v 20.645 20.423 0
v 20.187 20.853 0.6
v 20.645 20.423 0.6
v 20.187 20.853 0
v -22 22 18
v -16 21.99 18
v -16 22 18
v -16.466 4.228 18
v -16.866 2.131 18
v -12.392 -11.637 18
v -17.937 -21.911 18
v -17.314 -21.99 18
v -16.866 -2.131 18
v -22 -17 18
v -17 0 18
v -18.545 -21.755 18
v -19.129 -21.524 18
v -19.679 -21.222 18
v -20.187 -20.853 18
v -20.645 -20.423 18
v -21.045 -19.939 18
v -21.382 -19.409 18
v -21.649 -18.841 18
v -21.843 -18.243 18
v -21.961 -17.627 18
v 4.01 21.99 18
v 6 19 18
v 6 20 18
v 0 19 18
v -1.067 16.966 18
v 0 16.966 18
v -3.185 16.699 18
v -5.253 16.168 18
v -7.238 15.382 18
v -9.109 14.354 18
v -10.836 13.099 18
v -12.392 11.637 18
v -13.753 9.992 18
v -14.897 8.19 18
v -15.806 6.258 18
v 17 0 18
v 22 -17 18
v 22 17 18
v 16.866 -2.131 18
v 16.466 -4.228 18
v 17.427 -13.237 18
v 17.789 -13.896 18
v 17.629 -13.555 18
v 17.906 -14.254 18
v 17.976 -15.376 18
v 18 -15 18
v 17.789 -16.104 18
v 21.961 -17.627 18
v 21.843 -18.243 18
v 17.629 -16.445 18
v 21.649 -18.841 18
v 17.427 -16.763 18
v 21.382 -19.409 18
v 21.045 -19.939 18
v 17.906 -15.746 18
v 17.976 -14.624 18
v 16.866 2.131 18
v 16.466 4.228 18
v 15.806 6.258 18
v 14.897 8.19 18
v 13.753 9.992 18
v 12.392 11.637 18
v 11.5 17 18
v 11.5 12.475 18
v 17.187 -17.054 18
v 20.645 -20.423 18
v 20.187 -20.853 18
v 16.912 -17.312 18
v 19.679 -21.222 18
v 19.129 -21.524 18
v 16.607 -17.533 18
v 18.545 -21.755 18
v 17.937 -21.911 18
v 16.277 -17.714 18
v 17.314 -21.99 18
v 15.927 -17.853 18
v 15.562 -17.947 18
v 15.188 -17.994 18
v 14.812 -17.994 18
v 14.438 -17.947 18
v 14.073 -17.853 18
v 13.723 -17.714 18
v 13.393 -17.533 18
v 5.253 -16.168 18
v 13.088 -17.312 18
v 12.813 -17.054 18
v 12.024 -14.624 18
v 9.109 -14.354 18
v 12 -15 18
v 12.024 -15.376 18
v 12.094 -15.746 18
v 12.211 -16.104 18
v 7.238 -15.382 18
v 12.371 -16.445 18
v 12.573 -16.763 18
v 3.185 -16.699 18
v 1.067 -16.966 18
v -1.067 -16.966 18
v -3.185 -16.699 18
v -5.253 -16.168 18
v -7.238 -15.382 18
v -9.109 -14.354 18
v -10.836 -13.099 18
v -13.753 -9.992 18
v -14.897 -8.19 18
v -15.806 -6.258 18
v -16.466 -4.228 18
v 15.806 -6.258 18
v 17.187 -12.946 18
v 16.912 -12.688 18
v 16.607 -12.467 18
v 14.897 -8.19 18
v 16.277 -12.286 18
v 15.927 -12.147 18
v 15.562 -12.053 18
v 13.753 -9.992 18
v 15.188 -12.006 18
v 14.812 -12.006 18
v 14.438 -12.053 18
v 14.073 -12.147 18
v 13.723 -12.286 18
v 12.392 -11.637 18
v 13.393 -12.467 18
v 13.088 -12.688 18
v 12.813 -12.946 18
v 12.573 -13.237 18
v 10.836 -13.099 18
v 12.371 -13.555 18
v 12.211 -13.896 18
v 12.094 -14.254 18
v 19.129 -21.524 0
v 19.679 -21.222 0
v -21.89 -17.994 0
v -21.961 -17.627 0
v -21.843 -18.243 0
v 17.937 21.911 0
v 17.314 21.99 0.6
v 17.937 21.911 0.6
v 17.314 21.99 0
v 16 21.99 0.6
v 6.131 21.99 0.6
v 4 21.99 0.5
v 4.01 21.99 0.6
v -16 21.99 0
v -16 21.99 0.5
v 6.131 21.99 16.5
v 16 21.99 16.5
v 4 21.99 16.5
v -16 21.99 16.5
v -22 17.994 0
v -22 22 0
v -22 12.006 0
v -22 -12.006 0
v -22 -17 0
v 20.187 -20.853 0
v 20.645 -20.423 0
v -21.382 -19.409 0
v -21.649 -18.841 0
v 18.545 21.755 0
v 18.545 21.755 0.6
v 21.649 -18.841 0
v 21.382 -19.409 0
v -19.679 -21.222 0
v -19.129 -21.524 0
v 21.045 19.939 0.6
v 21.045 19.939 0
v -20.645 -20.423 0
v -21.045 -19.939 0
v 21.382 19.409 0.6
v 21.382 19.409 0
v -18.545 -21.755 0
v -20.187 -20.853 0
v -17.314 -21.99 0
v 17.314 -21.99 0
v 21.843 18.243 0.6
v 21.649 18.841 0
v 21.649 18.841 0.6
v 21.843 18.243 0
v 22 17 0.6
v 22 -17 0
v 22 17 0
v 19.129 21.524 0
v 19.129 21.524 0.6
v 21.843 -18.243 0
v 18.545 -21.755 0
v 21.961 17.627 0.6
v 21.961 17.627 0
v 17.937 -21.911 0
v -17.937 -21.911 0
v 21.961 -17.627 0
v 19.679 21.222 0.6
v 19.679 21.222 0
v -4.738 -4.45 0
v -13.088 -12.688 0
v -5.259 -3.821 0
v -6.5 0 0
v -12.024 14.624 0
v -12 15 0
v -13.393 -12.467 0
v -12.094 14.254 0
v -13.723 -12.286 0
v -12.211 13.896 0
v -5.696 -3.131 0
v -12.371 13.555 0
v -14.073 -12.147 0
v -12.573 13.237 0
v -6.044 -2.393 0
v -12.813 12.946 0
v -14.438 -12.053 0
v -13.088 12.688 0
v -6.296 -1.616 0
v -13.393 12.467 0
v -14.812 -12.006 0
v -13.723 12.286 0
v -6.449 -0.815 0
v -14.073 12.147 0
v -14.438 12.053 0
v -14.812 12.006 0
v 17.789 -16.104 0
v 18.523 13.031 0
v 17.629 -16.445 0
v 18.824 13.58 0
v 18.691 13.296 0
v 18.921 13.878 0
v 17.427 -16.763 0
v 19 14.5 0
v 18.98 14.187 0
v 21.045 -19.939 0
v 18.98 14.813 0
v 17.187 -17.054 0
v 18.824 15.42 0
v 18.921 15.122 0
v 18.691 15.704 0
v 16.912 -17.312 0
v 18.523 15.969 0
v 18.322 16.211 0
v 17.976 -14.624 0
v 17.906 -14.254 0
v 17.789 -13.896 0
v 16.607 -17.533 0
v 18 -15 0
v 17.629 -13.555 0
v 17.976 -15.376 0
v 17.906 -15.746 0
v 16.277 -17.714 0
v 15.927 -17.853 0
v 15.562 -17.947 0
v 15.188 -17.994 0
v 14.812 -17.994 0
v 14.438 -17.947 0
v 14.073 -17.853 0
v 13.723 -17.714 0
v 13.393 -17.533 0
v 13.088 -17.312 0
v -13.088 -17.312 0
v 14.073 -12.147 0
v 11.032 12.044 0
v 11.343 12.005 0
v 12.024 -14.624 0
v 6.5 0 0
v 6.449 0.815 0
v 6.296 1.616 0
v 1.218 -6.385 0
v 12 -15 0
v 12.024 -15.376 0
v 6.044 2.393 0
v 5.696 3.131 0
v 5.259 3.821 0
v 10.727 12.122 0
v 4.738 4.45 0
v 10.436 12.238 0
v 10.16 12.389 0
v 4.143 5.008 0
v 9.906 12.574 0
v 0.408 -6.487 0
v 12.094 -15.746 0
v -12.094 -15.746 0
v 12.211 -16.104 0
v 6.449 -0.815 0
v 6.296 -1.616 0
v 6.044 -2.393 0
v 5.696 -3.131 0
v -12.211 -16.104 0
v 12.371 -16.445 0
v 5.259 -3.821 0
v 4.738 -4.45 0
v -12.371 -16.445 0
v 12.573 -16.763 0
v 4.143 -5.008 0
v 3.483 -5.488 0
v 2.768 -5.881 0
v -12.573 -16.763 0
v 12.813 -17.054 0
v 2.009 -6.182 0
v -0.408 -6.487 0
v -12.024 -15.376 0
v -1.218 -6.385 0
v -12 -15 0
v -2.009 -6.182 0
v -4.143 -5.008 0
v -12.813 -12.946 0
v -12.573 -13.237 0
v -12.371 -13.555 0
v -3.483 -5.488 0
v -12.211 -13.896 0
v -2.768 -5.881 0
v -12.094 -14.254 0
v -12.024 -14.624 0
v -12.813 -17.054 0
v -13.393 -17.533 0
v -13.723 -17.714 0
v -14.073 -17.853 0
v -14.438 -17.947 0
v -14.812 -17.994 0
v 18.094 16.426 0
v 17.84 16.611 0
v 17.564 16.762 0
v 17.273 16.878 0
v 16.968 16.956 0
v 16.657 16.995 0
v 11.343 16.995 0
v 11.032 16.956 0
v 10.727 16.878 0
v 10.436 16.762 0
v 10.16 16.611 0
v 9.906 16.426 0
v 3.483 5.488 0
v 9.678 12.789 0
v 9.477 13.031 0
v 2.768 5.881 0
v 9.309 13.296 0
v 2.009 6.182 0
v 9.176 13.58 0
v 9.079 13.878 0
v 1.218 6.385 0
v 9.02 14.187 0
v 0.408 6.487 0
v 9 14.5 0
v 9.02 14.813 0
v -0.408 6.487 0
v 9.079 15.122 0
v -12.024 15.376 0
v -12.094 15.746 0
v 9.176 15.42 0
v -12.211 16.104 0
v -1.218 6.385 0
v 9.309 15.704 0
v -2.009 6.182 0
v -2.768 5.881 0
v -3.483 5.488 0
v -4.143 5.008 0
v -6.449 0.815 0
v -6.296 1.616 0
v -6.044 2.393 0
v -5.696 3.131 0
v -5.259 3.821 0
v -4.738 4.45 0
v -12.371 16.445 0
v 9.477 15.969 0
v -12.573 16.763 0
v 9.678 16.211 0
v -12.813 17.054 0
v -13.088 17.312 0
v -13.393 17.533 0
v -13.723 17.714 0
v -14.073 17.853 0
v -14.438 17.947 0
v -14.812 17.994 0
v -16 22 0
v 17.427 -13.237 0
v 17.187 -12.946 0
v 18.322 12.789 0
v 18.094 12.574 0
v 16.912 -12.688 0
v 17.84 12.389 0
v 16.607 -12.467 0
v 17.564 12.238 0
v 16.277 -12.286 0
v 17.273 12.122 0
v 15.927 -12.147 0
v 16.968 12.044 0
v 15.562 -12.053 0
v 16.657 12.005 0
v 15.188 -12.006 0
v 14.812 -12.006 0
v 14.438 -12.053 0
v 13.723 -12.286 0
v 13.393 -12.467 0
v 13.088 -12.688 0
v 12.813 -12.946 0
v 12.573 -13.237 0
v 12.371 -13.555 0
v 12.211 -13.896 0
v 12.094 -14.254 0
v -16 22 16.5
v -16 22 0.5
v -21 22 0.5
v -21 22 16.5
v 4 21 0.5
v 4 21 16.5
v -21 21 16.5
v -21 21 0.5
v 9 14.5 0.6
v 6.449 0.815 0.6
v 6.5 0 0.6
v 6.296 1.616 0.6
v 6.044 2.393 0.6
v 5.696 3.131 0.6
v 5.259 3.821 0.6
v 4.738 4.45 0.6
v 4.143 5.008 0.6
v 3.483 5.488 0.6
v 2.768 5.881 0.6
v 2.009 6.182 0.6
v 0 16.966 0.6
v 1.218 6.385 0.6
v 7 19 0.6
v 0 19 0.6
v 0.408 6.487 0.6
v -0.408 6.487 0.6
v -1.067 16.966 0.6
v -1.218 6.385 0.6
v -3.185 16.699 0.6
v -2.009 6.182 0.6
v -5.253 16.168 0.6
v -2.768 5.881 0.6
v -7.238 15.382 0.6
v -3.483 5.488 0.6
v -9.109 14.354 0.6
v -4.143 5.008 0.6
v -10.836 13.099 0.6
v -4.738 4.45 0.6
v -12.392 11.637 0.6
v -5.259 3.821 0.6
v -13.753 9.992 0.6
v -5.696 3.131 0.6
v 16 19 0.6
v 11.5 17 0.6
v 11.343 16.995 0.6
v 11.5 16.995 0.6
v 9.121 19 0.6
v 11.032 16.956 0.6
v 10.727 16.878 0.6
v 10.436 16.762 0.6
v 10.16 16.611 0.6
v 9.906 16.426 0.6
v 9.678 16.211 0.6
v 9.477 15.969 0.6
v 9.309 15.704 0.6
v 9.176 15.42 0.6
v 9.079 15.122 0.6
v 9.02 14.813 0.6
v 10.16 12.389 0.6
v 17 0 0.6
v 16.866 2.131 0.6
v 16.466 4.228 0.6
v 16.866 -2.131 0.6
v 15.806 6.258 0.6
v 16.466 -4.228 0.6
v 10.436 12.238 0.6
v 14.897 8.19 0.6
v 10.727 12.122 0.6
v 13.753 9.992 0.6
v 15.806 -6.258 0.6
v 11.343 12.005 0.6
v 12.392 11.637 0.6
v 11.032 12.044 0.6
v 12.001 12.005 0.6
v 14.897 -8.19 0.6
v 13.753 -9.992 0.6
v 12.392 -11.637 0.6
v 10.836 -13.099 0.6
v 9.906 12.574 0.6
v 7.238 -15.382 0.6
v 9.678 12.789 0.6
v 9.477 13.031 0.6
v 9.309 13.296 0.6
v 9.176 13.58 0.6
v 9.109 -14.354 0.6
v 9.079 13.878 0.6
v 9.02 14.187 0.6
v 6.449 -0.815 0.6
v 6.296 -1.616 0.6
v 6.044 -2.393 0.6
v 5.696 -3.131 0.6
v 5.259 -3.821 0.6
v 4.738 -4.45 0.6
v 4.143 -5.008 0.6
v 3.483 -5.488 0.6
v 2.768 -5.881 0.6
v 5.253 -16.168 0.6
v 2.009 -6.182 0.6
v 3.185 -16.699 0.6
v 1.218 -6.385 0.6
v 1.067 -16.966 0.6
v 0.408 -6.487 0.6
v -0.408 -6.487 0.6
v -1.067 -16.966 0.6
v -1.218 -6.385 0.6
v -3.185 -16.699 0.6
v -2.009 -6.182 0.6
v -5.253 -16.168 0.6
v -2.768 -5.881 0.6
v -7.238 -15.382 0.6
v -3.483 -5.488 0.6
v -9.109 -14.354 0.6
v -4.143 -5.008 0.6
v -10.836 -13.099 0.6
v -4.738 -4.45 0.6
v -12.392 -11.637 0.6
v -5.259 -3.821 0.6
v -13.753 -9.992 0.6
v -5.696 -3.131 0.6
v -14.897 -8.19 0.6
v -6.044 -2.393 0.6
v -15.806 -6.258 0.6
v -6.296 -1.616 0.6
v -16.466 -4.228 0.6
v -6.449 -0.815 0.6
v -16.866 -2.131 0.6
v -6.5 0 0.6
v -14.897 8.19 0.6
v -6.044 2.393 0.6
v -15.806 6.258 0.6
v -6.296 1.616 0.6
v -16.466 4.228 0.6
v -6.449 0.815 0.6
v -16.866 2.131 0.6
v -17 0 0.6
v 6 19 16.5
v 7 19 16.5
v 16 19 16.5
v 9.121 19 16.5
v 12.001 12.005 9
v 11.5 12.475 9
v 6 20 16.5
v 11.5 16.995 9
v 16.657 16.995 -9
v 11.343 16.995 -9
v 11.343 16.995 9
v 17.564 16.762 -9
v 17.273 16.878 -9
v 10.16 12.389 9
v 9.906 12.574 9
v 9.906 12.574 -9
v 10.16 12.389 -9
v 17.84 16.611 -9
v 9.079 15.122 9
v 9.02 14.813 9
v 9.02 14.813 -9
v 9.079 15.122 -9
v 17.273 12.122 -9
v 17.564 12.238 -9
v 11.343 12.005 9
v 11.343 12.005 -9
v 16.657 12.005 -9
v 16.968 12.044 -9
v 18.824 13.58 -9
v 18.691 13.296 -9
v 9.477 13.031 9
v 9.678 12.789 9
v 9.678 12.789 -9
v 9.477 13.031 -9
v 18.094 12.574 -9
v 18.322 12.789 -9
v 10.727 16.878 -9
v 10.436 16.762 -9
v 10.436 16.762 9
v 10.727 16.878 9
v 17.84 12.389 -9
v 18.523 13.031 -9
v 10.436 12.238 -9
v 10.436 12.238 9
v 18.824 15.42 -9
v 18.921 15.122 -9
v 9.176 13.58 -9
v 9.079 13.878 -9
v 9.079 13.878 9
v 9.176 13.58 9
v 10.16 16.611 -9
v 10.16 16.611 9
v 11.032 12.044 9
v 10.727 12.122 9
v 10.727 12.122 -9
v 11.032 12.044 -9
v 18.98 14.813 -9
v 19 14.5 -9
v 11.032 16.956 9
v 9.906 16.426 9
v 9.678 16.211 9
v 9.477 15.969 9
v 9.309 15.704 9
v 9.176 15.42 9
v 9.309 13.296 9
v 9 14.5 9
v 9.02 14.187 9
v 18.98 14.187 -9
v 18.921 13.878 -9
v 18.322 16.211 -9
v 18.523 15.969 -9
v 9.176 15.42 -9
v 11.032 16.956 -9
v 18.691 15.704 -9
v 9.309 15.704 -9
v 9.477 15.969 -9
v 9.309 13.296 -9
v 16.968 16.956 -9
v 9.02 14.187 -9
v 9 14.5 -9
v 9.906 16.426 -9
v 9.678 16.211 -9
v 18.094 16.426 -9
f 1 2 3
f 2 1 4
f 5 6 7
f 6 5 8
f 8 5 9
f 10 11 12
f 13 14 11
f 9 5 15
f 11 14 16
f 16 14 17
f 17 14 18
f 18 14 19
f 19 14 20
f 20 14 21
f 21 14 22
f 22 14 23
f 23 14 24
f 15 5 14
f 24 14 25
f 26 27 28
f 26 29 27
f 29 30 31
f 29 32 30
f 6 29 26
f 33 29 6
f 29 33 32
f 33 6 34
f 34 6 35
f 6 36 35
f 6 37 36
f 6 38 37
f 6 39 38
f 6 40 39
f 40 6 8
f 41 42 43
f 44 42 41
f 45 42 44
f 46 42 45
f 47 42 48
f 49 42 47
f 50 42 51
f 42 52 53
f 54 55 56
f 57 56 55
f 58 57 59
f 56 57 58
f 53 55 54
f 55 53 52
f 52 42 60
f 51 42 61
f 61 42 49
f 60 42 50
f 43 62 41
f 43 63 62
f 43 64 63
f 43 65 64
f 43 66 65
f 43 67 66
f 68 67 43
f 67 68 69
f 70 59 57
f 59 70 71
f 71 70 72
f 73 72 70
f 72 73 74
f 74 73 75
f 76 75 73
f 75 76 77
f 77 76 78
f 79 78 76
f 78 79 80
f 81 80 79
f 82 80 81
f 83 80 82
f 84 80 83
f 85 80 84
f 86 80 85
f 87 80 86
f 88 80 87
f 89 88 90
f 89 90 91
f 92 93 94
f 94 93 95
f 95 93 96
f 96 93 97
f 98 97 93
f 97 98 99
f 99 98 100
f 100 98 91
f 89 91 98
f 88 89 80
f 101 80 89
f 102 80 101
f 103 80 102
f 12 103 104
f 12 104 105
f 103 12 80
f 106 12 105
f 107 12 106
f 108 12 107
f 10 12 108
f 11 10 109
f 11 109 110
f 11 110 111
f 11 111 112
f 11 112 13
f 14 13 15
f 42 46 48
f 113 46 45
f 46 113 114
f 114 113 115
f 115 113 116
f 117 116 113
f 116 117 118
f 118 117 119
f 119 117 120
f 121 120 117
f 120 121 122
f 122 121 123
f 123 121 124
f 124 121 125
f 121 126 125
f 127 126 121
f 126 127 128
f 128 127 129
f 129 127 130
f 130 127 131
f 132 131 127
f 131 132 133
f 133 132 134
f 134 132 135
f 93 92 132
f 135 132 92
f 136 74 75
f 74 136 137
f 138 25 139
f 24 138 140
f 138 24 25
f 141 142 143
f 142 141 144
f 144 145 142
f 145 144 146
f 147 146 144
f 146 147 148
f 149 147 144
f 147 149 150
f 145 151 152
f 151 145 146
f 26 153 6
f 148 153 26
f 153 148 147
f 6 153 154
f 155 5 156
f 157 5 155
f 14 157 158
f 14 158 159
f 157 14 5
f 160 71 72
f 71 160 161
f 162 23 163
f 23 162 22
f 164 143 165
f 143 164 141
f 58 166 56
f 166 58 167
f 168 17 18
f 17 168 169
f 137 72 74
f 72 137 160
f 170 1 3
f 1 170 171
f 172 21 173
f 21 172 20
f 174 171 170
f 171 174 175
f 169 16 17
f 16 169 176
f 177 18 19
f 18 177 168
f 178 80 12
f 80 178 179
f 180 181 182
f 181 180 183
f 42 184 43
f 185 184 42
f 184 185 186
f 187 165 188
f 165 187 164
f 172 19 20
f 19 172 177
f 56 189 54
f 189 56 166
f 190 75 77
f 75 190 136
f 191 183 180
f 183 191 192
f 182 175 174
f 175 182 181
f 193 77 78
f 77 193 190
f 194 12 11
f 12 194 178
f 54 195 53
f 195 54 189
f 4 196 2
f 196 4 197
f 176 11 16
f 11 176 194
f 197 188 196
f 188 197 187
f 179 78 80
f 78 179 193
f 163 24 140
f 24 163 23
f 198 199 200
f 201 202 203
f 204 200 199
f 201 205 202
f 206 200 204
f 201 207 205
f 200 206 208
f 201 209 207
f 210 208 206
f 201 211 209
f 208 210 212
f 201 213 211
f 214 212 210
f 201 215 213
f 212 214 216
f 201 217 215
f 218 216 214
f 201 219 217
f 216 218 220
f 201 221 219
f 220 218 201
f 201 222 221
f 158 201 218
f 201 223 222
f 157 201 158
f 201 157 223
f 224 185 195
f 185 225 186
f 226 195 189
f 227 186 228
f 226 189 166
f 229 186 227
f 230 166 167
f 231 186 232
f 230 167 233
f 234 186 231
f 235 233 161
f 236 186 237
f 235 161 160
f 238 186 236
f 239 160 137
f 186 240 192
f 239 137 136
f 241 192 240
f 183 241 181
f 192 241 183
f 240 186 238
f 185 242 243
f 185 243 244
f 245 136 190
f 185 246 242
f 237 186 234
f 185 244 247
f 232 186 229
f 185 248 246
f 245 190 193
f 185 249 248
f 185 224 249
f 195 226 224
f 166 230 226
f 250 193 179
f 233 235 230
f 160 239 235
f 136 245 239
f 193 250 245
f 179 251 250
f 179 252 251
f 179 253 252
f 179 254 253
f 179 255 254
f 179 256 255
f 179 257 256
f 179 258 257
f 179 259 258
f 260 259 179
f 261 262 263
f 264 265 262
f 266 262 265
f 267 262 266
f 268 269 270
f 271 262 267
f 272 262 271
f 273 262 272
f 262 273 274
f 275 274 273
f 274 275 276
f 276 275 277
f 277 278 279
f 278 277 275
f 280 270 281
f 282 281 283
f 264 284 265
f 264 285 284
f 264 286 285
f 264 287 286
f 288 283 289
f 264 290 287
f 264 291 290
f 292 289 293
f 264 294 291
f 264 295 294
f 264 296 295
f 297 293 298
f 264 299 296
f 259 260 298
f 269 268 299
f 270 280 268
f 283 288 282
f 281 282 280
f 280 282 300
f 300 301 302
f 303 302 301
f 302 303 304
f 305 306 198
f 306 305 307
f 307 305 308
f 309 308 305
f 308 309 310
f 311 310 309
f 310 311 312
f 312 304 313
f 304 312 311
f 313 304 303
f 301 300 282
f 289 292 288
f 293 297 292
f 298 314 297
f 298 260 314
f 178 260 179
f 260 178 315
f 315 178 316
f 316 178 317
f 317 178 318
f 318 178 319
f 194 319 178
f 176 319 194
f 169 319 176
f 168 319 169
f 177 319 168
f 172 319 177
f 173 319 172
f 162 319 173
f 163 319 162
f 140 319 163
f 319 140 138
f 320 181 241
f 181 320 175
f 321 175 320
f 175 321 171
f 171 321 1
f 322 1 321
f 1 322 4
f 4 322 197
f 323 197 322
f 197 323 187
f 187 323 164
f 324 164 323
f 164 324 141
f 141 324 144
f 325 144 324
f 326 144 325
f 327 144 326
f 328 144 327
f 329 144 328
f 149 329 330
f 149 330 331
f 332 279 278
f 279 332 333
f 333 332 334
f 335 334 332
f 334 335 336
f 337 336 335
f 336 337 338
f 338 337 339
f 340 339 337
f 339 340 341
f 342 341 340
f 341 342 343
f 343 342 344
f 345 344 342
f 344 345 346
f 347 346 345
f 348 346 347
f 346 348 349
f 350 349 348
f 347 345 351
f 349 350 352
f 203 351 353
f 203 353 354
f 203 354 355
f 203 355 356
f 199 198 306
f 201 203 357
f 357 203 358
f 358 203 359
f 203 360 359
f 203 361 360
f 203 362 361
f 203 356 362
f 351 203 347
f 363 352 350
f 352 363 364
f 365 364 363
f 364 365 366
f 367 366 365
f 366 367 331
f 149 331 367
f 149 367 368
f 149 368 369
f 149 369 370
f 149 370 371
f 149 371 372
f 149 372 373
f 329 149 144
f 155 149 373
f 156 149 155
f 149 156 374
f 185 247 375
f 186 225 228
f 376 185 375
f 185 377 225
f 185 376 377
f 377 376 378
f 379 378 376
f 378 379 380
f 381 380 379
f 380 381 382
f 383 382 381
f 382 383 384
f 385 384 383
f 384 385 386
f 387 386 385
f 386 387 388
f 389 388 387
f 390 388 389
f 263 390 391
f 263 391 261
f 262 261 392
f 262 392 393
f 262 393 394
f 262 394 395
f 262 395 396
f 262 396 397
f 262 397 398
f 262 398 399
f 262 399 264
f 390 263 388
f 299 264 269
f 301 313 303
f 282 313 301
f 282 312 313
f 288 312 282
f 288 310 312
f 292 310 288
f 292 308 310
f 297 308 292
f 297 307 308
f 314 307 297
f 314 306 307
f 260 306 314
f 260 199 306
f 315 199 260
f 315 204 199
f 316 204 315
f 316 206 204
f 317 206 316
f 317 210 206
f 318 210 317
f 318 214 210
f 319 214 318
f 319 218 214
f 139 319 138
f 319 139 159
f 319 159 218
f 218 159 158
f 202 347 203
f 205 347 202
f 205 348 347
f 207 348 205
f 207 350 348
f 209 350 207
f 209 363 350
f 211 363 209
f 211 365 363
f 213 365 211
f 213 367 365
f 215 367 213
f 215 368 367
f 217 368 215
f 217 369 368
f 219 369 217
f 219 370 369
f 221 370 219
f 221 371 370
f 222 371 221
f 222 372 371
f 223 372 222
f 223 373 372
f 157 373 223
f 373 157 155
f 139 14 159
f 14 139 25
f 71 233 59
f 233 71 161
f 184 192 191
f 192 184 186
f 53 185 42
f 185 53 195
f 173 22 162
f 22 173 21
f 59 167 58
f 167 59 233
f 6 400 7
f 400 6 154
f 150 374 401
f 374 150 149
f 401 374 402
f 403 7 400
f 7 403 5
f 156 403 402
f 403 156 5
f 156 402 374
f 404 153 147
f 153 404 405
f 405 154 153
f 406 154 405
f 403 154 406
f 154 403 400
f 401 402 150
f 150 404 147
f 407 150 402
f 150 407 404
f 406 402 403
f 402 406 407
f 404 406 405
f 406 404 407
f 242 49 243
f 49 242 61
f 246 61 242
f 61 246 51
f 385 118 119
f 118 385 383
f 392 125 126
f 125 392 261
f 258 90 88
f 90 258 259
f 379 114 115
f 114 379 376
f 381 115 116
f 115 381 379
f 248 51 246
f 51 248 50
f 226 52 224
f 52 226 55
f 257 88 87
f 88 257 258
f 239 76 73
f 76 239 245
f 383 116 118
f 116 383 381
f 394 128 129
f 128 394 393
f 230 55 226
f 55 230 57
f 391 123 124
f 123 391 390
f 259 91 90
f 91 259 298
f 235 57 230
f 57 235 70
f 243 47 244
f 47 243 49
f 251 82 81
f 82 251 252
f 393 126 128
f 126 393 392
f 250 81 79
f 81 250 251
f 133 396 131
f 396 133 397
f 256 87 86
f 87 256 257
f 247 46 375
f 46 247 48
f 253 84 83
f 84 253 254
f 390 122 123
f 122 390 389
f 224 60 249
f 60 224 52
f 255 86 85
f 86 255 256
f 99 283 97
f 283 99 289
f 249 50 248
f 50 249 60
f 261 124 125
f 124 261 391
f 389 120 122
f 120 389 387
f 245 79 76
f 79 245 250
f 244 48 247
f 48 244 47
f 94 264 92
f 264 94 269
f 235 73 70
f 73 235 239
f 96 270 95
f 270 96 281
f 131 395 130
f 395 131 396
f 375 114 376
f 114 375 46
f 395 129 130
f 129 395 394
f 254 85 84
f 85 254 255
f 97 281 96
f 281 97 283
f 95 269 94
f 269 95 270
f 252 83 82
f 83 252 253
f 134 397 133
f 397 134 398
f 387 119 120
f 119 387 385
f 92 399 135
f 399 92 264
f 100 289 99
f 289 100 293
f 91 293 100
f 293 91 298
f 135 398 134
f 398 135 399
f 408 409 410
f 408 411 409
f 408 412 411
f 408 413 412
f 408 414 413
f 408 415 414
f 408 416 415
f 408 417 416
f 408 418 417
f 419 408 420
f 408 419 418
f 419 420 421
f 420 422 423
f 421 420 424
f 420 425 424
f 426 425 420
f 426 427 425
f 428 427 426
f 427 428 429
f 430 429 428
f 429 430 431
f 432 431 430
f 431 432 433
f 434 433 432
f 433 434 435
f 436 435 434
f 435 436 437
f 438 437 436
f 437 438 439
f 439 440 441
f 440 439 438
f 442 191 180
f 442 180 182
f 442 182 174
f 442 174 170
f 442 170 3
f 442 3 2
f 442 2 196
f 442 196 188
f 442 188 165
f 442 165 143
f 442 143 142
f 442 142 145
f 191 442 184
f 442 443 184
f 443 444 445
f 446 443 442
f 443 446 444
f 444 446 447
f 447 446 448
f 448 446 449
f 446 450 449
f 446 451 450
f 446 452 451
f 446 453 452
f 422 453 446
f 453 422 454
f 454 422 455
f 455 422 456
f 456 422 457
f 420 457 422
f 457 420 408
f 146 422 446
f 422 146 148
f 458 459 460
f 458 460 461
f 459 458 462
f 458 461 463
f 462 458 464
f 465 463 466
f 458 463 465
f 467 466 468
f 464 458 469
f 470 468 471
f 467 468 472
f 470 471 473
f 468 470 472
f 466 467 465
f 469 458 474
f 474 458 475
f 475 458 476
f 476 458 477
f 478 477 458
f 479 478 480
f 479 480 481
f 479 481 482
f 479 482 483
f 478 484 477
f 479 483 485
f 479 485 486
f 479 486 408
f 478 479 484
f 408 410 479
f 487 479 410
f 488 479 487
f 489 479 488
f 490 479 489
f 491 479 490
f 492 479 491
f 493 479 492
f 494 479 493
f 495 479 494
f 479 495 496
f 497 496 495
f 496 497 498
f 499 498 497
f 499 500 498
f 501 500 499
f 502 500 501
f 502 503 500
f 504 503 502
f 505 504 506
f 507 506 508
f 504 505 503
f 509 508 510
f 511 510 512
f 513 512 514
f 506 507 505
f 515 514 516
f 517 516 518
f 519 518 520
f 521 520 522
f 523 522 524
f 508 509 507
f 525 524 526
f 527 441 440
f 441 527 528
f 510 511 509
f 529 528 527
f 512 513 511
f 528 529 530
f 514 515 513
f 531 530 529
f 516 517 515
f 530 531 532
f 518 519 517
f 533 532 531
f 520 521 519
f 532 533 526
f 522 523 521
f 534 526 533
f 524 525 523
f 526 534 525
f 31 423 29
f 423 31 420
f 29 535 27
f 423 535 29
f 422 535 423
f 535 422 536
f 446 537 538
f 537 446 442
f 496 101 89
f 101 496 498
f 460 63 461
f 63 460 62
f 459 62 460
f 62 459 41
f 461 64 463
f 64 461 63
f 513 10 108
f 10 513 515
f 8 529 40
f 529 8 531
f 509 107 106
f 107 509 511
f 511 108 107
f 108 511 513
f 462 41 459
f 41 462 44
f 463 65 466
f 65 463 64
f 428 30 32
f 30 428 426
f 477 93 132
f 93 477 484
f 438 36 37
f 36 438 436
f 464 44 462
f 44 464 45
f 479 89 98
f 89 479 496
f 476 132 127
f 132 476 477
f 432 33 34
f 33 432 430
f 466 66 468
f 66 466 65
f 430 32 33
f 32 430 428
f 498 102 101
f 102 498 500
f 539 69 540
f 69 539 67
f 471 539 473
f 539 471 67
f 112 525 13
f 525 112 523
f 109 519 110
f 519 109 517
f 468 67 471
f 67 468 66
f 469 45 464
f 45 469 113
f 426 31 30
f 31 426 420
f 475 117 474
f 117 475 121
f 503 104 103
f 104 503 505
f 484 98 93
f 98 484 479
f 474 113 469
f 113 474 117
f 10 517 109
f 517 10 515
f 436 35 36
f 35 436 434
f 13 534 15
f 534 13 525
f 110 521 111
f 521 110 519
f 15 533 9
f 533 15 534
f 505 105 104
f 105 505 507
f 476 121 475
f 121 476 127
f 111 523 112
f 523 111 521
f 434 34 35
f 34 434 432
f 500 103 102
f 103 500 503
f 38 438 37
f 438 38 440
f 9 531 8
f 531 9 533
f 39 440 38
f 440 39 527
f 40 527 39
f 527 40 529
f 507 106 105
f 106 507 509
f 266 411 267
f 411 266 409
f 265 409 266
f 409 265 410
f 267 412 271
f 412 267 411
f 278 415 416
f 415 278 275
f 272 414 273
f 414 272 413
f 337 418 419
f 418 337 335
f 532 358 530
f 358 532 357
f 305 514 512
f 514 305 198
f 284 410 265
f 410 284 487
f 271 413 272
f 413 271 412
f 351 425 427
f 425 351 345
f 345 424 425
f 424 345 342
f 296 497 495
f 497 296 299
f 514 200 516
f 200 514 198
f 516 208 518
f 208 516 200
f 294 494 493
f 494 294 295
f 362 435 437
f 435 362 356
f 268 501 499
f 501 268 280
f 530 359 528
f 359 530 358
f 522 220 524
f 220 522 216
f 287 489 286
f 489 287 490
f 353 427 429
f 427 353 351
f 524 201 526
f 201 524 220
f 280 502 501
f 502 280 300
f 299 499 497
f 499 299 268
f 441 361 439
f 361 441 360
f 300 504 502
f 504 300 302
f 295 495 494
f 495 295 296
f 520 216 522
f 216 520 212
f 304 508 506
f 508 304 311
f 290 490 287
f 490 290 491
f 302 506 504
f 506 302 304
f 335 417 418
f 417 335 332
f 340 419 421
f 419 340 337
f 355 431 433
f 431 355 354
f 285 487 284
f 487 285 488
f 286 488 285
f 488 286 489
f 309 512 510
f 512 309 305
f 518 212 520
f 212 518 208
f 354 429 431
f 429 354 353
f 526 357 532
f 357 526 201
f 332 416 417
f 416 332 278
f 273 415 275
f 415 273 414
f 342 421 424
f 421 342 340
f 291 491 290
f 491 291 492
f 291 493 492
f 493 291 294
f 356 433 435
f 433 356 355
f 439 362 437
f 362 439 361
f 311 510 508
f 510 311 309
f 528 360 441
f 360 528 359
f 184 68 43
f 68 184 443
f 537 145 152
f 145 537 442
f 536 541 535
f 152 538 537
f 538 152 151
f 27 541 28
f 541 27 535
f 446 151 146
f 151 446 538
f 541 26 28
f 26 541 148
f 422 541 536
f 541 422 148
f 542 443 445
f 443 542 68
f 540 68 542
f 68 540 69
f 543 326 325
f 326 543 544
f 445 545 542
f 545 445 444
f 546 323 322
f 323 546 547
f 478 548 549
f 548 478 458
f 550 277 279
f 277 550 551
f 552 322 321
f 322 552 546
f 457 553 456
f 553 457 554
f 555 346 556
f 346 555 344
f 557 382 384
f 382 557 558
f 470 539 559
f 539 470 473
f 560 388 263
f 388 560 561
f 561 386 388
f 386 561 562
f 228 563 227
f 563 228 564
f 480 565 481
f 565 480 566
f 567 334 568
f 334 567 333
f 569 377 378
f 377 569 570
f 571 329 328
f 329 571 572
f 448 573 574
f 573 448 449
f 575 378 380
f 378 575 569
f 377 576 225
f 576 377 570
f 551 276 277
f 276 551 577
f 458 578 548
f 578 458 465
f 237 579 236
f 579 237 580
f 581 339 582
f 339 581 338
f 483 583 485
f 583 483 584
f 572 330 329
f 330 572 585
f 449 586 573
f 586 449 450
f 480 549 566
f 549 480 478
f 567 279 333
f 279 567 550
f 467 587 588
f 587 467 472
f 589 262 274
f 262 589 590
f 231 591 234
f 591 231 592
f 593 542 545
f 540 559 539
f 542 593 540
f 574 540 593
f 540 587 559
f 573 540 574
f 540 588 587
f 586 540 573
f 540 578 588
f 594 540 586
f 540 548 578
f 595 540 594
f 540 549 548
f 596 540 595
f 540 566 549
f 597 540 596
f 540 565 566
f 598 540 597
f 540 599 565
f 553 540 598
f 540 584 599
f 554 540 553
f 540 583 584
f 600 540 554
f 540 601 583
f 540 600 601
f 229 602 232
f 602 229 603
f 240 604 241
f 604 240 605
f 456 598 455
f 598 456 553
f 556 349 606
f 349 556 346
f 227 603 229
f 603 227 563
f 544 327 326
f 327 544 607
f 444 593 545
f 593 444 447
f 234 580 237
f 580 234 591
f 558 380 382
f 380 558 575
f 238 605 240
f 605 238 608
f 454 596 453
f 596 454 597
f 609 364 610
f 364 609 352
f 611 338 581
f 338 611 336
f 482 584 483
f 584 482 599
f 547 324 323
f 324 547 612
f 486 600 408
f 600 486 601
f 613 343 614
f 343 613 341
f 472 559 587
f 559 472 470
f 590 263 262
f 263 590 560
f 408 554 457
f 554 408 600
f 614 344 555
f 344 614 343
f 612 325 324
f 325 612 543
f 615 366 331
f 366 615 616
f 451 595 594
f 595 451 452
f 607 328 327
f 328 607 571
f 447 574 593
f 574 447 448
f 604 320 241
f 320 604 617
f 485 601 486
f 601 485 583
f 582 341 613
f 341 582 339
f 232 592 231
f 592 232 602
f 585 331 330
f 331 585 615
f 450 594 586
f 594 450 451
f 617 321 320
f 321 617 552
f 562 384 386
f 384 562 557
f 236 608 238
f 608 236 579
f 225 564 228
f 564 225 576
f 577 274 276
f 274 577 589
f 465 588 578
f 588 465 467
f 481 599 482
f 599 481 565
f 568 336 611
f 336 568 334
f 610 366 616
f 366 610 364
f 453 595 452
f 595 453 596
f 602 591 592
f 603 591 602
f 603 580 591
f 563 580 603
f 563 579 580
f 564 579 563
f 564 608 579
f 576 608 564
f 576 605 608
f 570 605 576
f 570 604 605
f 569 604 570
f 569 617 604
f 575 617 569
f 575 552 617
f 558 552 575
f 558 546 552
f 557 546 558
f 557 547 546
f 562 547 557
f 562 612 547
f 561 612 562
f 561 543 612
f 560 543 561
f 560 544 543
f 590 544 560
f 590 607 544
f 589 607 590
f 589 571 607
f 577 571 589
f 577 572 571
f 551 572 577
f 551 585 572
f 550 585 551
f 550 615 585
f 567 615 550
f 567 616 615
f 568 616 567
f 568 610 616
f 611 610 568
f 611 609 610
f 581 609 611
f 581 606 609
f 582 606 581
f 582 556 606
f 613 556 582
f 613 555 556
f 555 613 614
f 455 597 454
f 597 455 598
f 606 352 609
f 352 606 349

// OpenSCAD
$fn = 50;


union() {
	difference() {
		union() {
			hull() {
				translate(v = [-17.0000000000, 17.0000000000, 0]) {
					cylinder(h = 18, r = 5);
				}
				translate(v = [17.0000000000, 17.0000000000, 0]) {
					cylinder(h = 18, r = 5);
				}
				translate(v = [-17.0000000000, -17.0000000000, 0]) {
					cylinder(h = 18, r = 5);
				}
				translate(v = [17.0000000000, -17.0000000000, 0]) {
					cylinder(h = 18, r = 5);
				}
			}
			translate(v = [-22.0000000000, 16.0000000000, 0]) {
				cube(size = [6, 6, 18]);
			}
		}
		union() {
			translate(v = [-22.5000000000, -15.0000000000, -250.0000000000]) {
				rotate(a = [0, 0, 0]) {
					difference() {
						union() {
							hull() {
								translate(v = [7.5000000000, 0, 0]) {
									cylinder(h = 250, r = 3.0000000000, r1 = 3.0000000000, r2 = 3.0000000000);
								}
								translate(v = [-7.5000000000, 0, 0]) {
									cylinder(h = 250, r = 3.0000000000, r1 = 3.0000000000, r2 = 3.0000000000);
								}
							}
						}
						union();
					}
				}
			}
			translate(v = [-22.5000000000, 15.0000000000, -250.0000000000]) {
				rotate(a = [0, 0, 0]) {
					difference() {
						union() {
							hull() {
								translate(v = [7.5000000000, 0, 0]) {
									cylinder(h = 250, r = 3.0000000000, r1 = 3.0000000000, r2 = 3.0000000000);
								}
								translate(v = [-7.5000000000, 0, 0]) {
									cylinder(h = 250, r = 3.0000000000, r1 = 3.0000000000, r2 = 3.0000000000);
								}
							}
						}
						union();
					}
				}
			}
			translate(v = [-21.0000000000, 21.0000000000, 0.5000000000]) {
				cube(size = [25, 1, 16]);
			}
			translate(v = [15.0000000000, -15.0000000000, 0]) {
				cylinder(h = 100, r = 3.0000000000);
			}
			translate(v = [0.0000000000, 11.0000000000, 0.6000000000]) {
				cube(size = [11, 8, 20.4000000000]);
			}
			translate(v = [0, 0, 0.6000000000]) {
				cylinder(h = 20.4000000000, r = 17.0000000000);
			}
			translate(v = [0, 0, -9.0000000000]) {
				cylinder(h = 18, r = 6.5000000000);
			}
			translate(v = [0.0000000000, 17.0000000000, 0.6000000000]) {
				cube(size = [22.0000000000, 2, 20.4000000000]);
			}
			translate(v = [16.0000000000, 17.0000000000, 0.6000000000]) {
				cube(size = [6, 5, 20.4000000000]);
			}
			translate(v = [6.0000000000, 17.0000000000, 16.5000000000]) {
				cube(size = [16, 5, 1.5000000000]);
			}
			translate(v = [3.2500000000, 22.7500000000, 0.6000000000]) {
				rotate(a = [0, 0, -45]) {
					cube(size = [7.5000000000, 1.5000000000, 20.4000000000]);
				}
			}
			translate(v = [2.5000000000, 12.0000000000, 0.6000000000]) {
				cube(size = [9.0000000000, 5, 17.4000000000]);
			}
		}
	}
	union() {
		translate(v = [14, 14.5000000000, -9.0000000000]) {
			rotate(a = [0, 0, 0]) {
				difference() {
					union() {
						#hull() {
							#translate(v = [2.5000000000, 0, 0]) {
								cylinder(h = 18, r = 2.5000000000, r1 = 2.5000000000, r2 = 2.5000000000);
							}
							#translate(v = [-2.5000000000, 0, 0]) {
								cylinder(h = 18, r = 2.5000000000, r1 = 2.5000000000, r2 = 2.5000000000);
							}
						}
					}
					union();
				}
			}
		}
	}
}
